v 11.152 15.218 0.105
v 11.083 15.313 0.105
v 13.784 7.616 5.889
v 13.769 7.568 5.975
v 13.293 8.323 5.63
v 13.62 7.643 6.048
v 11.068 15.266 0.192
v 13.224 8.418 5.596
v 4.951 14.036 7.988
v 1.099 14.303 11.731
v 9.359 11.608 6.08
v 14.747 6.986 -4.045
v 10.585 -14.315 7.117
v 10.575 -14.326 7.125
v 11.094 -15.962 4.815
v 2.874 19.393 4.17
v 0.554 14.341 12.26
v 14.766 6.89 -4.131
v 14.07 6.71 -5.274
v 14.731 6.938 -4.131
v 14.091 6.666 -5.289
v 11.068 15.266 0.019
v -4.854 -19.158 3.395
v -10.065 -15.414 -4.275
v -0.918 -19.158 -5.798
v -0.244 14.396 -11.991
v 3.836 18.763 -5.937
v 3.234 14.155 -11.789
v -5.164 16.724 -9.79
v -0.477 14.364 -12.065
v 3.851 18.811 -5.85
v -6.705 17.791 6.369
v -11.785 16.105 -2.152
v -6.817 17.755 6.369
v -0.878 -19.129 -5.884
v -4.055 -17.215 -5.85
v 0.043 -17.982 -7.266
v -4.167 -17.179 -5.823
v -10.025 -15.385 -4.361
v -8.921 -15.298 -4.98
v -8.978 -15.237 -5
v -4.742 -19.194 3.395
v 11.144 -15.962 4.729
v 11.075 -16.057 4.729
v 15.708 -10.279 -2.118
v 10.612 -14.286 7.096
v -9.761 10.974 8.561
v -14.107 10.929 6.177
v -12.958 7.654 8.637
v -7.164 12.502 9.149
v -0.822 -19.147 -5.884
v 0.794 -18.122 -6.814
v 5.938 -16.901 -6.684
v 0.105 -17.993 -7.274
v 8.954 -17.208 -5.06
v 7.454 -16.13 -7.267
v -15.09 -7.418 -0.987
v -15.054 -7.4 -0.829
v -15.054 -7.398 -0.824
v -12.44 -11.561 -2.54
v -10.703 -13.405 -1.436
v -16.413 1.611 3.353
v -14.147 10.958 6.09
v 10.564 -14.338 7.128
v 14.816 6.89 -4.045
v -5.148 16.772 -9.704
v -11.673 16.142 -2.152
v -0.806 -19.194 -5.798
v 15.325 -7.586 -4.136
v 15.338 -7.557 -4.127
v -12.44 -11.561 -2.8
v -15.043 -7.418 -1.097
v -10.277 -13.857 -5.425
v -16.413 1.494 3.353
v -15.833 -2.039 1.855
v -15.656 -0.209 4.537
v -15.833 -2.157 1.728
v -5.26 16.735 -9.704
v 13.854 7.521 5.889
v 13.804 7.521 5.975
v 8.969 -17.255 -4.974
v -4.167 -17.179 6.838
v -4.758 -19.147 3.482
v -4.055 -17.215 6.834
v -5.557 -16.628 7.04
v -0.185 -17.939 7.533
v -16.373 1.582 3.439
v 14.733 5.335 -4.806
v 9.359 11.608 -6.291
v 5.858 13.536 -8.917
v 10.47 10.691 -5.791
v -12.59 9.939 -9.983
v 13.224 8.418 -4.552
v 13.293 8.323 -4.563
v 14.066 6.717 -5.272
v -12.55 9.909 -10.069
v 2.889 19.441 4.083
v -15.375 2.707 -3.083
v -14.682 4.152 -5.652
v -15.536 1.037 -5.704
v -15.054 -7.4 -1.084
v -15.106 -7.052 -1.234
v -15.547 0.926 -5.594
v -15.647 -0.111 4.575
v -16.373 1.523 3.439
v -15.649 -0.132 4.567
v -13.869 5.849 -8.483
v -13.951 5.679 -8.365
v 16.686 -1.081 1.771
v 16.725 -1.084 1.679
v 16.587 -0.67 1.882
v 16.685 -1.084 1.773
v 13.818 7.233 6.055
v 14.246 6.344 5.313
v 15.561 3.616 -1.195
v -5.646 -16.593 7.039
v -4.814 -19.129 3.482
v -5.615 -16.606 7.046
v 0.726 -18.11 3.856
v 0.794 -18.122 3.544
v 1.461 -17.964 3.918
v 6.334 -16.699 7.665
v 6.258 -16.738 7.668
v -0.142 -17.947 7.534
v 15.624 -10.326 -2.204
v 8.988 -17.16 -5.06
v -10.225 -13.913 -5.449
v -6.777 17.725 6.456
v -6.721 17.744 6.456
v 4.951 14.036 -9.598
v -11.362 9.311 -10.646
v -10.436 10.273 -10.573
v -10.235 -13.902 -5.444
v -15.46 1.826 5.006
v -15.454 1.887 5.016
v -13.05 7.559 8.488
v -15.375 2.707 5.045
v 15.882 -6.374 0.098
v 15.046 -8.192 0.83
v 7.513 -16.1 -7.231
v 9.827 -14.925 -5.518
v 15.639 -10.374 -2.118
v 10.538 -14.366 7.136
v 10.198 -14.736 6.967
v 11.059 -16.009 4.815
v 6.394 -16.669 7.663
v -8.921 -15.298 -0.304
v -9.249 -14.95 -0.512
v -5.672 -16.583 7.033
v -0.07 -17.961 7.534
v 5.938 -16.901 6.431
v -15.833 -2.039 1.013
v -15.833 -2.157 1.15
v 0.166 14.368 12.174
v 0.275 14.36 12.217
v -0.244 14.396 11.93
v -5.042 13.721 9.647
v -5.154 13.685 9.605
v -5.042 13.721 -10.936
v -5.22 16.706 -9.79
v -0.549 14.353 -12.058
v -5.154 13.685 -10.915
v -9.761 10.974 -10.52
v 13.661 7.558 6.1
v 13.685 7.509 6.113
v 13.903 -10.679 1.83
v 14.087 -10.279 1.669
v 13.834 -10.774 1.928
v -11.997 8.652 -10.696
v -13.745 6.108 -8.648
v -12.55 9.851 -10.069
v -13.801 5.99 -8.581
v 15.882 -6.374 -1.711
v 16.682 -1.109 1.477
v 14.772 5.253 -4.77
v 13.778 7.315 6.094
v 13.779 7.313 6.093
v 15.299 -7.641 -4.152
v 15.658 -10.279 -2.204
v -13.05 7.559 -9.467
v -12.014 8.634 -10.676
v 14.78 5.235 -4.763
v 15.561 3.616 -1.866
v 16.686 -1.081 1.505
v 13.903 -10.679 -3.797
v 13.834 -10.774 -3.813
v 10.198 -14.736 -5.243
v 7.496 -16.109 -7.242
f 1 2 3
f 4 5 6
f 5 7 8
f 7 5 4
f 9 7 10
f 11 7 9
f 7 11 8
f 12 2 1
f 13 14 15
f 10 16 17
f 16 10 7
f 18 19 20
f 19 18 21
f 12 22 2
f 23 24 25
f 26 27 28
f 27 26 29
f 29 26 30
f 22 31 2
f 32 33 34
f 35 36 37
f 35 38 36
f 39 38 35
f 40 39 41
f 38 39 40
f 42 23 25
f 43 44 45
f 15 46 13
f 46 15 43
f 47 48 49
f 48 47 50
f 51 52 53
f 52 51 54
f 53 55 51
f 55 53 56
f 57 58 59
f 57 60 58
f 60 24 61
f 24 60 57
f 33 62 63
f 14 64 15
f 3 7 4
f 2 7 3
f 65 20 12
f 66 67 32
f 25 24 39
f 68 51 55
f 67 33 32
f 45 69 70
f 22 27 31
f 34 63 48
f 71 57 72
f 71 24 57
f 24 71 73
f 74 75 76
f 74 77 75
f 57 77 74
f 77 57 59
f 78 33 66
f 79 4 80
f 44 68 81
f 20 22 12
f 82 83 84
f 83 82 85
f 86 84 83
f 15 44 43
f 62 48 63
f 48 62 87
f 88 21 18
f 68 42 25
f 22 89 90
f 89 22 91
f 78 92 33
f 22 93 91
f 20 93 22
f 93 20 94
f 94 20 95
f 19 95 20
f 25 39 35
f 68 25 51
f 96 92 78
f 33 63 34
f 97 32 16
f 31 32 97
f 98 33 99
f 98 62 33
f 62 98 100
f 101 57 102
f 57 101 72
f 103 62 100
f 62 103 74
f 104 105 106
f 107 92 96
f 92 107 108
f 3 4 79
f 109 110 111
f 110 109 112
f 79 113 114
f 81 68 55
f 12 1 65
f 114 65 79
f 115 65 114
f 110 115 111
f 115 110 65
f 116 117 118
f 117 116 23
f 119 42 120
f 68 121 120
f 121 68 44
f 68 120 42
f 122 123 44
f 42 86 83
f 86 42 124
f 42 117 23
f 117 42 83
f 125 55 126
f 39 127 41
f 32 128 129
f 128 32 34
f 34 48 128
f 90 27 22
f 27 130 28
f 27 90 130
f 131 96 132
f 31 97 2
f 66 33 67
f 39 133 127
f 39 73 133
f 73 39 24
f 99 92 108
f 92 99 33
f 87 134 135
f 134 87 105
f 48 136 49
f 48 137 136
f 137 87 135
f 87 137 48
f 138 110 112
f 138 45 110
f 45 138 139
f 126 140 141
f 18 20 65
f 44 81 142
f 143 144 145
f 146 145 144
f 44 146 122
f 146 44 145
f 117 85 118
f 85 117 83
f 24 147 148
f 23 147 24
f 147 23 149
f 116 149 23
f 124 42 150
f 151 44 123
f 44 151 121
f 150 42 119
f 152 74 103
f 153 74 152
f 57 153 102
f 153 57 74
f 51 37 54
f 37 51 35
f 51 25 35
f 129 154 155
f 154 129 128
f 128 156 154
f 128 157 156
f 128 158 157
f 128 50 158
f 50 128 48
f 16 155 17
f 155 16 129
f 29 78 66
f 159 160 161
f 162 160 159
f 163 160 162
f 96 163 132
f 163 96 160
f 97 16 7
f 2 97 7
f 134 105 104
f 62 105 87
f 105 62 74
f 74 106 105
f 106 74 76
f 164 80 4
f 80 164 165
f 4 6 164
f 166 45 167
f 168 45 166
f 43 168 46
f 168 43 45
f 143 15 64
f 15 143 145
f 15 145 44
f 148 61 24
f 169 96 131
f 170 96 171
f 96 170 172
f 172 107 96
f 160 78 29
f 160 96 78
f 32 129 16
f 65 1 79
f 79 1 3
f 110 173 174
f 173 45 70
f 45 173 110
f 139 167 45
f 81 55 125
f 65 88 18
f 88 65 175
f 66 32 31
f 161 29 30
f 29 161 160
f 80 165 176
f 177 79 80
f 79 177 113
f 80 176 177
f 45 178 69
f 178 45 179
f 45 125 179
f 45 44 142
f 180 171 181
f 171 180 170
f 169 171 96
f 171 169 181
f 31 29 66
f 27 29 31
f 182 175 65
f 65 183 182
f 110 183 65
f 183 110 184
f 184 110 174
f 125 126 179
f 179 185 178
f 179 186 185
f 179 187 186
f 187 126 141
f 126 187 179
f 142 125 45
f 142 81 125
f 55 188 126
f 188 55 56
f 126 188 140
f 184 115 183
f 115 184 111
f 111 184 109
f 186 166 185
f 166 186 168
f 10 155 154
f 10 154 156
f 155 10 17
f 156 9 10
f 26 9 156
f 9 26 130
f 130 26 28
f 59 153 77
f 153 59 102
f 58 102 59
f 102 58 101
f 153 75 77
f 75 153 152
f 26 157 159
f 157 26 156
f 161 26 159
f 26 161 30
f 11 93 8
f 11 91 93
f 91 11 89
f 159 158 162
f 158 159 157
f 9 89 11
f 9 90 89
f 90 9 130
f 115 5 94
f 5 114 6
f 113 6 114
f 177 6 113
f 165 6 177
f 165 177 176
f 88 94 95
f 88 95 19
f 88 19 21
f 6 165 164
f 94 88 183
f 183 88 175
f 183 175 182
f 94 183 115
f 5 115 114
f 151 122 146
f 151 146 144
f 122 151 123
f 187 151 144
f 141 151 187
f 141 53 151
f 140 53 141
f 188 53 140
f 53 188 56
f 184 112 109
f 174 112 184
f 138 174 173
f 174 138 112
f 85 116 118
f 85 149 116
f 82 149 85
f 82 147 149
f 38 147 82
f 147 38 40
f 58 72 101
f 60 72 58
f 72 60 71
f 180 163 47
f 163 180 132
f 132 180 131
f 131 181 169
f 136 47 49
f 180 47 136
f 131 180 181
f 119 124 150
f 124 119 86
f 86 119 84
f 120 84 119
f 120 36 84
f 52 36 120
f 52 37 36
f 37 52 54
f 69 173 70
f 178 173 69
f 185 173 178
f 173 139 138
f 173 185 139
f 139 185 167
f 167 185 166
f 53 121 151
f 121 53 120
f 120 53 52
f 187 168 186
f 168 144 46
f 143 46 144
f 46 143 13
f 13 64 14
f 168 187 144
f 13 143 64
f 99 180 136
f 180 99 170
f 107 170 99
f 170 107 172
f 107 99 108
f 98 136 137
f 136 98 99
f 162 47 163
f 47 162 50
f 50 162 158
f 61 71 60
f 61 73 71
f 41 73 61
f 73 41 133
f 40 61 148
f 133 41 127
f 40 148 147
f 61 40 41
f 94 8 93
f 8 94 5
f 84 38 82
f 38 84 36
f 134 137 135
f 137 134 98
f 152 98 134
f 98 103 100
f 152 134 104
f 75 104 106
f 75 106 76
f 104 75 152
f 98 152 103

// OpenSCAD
// Auto-generated OpenSCAD file

    inner_points = 10*[[0.6684524443178234, 0.2912194859296234, -1.8363167690860016], [0.5910161587361856, -0.7871337989465796, 1.8171417764513753], [-0.2918345035641626, 0.5700386873175909, -1.8258845754108513], [0.7005256026010808, -0.7077839963284758, -1.8052788091992973], [0.8693085877915654, 0.17268677431141555, 1.78111690891311], [-0.4082680905441584, -0.8185618492857674, 1.8381956785148106], [-0.8532513180248714, -0.25664505176664254, -1.7883991652556823], [-0.2399390433352969, -1.0463829018555162, -1.7756641013727077], [0.04201851847921482, 0.7344604613470775, 1.7799062183976844], [-0.747567291966454, 0.12183512066246743, 1.8151828380475596], [-1.0794361675796518, -1.0564562485718862, -1.2323933529687556], [-0.785395180165941, 0.954977290682234, 1.26341914278561], [-1.1313316278085175, 0.5599653406012208, -1.2826138270068992], [0.4743407530463006, -1.5075951931337195, -1.2492729969123706], [0.8314806995920784, 1.005828944331182, 1.2293532136511605], [-1.2356817891893142, -0.598045019950611, 1.3217086029027356], [0.3903721345341776, 1.107829878297487, -1.3305314308372185], [1.3827322406994211, -0.1699928053485799, -1.3099256646256645], [1.3804783398490494, -0.5157653159624755, 1.266588771704851], [0.10290166151332539, -1.5070139395596582, 1.3236675413065515], [-0.9679627459509822, 1.0915308609299377, -0.45150089482603184], [1.0167574663795047, -1.4641145063621959, -0.41028936240292346], [1.3192715310196481, 0.8322870325903506, 0.3738163590127774], [-1.2358818256517996, -1.1502102146040154, 0.4879738982161779], [0.9327888478673815, 1.1513105650690107, -0.49154779632777174], [-1.4973064021284335, -0.7341563604123948, -0.38297752478415814], [1.546101122556956, 0.36157271498013704, -0.4788127324447971], [-0.8839941274388591, -1.5238942105012685, -0.3702424609011835], [-0.5073027875730468, 1.3626326692868251, 0.393659570560787], [-1.2968885980187155, 0.7500073286022151, 0.4289361902106621], [1.380278303386564, -1.0679305106158798, 0.43285406701829315], [0.5906924929408951, -1.6805558513004897, 0.46813068666816826], [-0.027498100014604697, 1.4301297664569783, -0.4811156026526214], [-1.5293795604116909, 0.2648471218457043, -0.4140154846708627], [1.5781742808402135, -0.6374307672779622, -0.44777477255809256], [0.07629282044312705, -1.8027134118892363, -0.38067465457633387], [0.49198146170729756, 1.3940607196260126, 0.3726056684973519], [-1.5751810270740951, -0.2098132446557805, 0.4649610577489272], [1.6585707324419436, -0.10810993735788438, 0.39682919948002804], [-0.40859175633944894, -1.7119839016396772, 0.48918458873160336]];

    outer_points = 10*[[1.104376346611005, -1.5961573617657159, 0.4728512902850581], [-0.673634048825412, 1.769605898412857, 0.6369190794461355], [0.893817731891513, -1.7160073529394246, -0.4973554141769706], [0.2569582435104783, -1.7160073529394246, 0.990073233123108], [0.2858087158543201, 1.9345652594329796, 0.40831901270173326], [-1.1703713108325864, 1.6046465373927346, -0.21516102344645555], [-0.08373275172975375, -1.9099287122098603, -0.5797541908094787], [-0.4773335616071019, -1.9099287122098603, 0.3395272690622494], [0.3820396926793872, 1.8715563902857573, -0.585043701269393], [-0.5179290575518498, 1.667655406539957, -0.9703755549159867], [-0.9984278133317204, -1.5355652274301959, -0.42748822105720446], [0.3014721351224021, 1.2549195998361895, -1.3681579568754045], [0.3727234801668946, -1.3416438681597602, -1.2643709042964242], [-0.6577368180914882, -1.3416438681597602, 1.1423392028753823], [1.1052099085285718, 1.5218294527292122, 0.010536610742315433], [-1.2509388683895712, 0.9880097469431668, -0.9982752790524669], [1.5608325785076533, -1.0278725177156156, -0.21176542320188751], [0.9239730901266188, -1.0278725177156156, 1.275663224098191], [0.04953616702377289, 1.419878960856312, 1.2324993914578442], [-1.4066438596631334, 1.089960238816067, 0.6090193553096552], [0.7176843678750273, -0.42213967519526474, -1.452822556112823], [-0.556034608887042, -0.42213967519526474, 1.5220347384873343], [1.3753551471929137, 0.7520583972355097, 0.5888739449609331], [-1.537004906180899, 0.09222095315501971, -0.6580861273354446], [1.6625347877120995, -0.10836832475112018, 0.1679301124100645], [-1.1072842188467662, -0.7359110256394092, -1.0179993899072812], [1.2689339778347515, -0.10836832475112018, 1.0872115722817925], [-1.5008850287241142, -0.7359110256394092, -0.09871793003555307], [0.9748488620108067, 0.524090167068165, -1.2565688719027843], [0.07488011177956955, 0.3201891833223645, -1.641900725549378], [-0.23652987076755477, 0.524090167068165, 1.5726885431748667], [-1.136498620998792, 0.3201891833223645, 1.187356689528273], [1.4519761729926075, -0.228218315924829, -0.8022765920519641], [-0.2598661157462394, -0.6160610344657005, -1.5352213327453308], [0.4215158747342246, -0.228218315924829, 1.6044335151198423], [-1.2903264140046222, -0.6160610344657005, 0.8714887744264755], [1.4715861240179806, 0.6890495280882876, -0.4044887690101932], [-0.8845626529001624, 0.15522982230224197, -1.4133006588049757], [0.7229128939121772, 0.6890495280882876, 1.3440884764304641], [-1.633235883005966, 0.15522982230224197, 0.3352765866356817]];

    // Convex hull for inner set (I)
    module inner_hull() {
        hull() {
            for (p = inner_points) {
                translate(p) sphere(r=0.1);
            }
        }
    }

    // Convex hull for outer set (O) minus inner hull (O \ I)
    module outer_minus_inner() {
        difference() {
            hull() {
                for (p = outer_points) {
                    translate(p) sphere(r=0.1);
                }
            }
            inner_hull(); // Subtract inner hull
        }
    }

    // Convex hull for outer set (O) minus all translated inner hulls
    module outer_minus_AllTranslationInner() {
        difference() {
            hull() {
                for (p = outer_points) {
                    translate(p) sphere(r=0.1);
                }
            }
            hull() {
                translate([0,0,50]) inner_hull();
                translate([0,0,-50]) inner_hull();
            }; // Subtract translated inner hulls
        }
    }

    // Difference between outer_minus_inner and outer_minus_AllTranslationInner
    module outer_minus_inner_diff() {
        difference() {
            // Outer minus inner
            difference() {
                hull() {
                    for (p = outer_points) {
                        translate(p) sphere(r=0.1);
                    }
                }
                inner_hull();
            }

            // Subtract Outer minus AllTranslationInner
            difference() {
                hull() {
                    for (p = outer_points) {
                        translate(p) sphere(r=0.1);
                    }
                }
                hull() {
                    translate([0,0,50]) inner_hull();
                    translate([0,0,-50]) inner_hull();
                };
            }
        }
    }

    // Rendering all with colors applied
    color([0, 1, 0, 1]) outer_minus_AllTranslationInner(); // Opaque green
    
